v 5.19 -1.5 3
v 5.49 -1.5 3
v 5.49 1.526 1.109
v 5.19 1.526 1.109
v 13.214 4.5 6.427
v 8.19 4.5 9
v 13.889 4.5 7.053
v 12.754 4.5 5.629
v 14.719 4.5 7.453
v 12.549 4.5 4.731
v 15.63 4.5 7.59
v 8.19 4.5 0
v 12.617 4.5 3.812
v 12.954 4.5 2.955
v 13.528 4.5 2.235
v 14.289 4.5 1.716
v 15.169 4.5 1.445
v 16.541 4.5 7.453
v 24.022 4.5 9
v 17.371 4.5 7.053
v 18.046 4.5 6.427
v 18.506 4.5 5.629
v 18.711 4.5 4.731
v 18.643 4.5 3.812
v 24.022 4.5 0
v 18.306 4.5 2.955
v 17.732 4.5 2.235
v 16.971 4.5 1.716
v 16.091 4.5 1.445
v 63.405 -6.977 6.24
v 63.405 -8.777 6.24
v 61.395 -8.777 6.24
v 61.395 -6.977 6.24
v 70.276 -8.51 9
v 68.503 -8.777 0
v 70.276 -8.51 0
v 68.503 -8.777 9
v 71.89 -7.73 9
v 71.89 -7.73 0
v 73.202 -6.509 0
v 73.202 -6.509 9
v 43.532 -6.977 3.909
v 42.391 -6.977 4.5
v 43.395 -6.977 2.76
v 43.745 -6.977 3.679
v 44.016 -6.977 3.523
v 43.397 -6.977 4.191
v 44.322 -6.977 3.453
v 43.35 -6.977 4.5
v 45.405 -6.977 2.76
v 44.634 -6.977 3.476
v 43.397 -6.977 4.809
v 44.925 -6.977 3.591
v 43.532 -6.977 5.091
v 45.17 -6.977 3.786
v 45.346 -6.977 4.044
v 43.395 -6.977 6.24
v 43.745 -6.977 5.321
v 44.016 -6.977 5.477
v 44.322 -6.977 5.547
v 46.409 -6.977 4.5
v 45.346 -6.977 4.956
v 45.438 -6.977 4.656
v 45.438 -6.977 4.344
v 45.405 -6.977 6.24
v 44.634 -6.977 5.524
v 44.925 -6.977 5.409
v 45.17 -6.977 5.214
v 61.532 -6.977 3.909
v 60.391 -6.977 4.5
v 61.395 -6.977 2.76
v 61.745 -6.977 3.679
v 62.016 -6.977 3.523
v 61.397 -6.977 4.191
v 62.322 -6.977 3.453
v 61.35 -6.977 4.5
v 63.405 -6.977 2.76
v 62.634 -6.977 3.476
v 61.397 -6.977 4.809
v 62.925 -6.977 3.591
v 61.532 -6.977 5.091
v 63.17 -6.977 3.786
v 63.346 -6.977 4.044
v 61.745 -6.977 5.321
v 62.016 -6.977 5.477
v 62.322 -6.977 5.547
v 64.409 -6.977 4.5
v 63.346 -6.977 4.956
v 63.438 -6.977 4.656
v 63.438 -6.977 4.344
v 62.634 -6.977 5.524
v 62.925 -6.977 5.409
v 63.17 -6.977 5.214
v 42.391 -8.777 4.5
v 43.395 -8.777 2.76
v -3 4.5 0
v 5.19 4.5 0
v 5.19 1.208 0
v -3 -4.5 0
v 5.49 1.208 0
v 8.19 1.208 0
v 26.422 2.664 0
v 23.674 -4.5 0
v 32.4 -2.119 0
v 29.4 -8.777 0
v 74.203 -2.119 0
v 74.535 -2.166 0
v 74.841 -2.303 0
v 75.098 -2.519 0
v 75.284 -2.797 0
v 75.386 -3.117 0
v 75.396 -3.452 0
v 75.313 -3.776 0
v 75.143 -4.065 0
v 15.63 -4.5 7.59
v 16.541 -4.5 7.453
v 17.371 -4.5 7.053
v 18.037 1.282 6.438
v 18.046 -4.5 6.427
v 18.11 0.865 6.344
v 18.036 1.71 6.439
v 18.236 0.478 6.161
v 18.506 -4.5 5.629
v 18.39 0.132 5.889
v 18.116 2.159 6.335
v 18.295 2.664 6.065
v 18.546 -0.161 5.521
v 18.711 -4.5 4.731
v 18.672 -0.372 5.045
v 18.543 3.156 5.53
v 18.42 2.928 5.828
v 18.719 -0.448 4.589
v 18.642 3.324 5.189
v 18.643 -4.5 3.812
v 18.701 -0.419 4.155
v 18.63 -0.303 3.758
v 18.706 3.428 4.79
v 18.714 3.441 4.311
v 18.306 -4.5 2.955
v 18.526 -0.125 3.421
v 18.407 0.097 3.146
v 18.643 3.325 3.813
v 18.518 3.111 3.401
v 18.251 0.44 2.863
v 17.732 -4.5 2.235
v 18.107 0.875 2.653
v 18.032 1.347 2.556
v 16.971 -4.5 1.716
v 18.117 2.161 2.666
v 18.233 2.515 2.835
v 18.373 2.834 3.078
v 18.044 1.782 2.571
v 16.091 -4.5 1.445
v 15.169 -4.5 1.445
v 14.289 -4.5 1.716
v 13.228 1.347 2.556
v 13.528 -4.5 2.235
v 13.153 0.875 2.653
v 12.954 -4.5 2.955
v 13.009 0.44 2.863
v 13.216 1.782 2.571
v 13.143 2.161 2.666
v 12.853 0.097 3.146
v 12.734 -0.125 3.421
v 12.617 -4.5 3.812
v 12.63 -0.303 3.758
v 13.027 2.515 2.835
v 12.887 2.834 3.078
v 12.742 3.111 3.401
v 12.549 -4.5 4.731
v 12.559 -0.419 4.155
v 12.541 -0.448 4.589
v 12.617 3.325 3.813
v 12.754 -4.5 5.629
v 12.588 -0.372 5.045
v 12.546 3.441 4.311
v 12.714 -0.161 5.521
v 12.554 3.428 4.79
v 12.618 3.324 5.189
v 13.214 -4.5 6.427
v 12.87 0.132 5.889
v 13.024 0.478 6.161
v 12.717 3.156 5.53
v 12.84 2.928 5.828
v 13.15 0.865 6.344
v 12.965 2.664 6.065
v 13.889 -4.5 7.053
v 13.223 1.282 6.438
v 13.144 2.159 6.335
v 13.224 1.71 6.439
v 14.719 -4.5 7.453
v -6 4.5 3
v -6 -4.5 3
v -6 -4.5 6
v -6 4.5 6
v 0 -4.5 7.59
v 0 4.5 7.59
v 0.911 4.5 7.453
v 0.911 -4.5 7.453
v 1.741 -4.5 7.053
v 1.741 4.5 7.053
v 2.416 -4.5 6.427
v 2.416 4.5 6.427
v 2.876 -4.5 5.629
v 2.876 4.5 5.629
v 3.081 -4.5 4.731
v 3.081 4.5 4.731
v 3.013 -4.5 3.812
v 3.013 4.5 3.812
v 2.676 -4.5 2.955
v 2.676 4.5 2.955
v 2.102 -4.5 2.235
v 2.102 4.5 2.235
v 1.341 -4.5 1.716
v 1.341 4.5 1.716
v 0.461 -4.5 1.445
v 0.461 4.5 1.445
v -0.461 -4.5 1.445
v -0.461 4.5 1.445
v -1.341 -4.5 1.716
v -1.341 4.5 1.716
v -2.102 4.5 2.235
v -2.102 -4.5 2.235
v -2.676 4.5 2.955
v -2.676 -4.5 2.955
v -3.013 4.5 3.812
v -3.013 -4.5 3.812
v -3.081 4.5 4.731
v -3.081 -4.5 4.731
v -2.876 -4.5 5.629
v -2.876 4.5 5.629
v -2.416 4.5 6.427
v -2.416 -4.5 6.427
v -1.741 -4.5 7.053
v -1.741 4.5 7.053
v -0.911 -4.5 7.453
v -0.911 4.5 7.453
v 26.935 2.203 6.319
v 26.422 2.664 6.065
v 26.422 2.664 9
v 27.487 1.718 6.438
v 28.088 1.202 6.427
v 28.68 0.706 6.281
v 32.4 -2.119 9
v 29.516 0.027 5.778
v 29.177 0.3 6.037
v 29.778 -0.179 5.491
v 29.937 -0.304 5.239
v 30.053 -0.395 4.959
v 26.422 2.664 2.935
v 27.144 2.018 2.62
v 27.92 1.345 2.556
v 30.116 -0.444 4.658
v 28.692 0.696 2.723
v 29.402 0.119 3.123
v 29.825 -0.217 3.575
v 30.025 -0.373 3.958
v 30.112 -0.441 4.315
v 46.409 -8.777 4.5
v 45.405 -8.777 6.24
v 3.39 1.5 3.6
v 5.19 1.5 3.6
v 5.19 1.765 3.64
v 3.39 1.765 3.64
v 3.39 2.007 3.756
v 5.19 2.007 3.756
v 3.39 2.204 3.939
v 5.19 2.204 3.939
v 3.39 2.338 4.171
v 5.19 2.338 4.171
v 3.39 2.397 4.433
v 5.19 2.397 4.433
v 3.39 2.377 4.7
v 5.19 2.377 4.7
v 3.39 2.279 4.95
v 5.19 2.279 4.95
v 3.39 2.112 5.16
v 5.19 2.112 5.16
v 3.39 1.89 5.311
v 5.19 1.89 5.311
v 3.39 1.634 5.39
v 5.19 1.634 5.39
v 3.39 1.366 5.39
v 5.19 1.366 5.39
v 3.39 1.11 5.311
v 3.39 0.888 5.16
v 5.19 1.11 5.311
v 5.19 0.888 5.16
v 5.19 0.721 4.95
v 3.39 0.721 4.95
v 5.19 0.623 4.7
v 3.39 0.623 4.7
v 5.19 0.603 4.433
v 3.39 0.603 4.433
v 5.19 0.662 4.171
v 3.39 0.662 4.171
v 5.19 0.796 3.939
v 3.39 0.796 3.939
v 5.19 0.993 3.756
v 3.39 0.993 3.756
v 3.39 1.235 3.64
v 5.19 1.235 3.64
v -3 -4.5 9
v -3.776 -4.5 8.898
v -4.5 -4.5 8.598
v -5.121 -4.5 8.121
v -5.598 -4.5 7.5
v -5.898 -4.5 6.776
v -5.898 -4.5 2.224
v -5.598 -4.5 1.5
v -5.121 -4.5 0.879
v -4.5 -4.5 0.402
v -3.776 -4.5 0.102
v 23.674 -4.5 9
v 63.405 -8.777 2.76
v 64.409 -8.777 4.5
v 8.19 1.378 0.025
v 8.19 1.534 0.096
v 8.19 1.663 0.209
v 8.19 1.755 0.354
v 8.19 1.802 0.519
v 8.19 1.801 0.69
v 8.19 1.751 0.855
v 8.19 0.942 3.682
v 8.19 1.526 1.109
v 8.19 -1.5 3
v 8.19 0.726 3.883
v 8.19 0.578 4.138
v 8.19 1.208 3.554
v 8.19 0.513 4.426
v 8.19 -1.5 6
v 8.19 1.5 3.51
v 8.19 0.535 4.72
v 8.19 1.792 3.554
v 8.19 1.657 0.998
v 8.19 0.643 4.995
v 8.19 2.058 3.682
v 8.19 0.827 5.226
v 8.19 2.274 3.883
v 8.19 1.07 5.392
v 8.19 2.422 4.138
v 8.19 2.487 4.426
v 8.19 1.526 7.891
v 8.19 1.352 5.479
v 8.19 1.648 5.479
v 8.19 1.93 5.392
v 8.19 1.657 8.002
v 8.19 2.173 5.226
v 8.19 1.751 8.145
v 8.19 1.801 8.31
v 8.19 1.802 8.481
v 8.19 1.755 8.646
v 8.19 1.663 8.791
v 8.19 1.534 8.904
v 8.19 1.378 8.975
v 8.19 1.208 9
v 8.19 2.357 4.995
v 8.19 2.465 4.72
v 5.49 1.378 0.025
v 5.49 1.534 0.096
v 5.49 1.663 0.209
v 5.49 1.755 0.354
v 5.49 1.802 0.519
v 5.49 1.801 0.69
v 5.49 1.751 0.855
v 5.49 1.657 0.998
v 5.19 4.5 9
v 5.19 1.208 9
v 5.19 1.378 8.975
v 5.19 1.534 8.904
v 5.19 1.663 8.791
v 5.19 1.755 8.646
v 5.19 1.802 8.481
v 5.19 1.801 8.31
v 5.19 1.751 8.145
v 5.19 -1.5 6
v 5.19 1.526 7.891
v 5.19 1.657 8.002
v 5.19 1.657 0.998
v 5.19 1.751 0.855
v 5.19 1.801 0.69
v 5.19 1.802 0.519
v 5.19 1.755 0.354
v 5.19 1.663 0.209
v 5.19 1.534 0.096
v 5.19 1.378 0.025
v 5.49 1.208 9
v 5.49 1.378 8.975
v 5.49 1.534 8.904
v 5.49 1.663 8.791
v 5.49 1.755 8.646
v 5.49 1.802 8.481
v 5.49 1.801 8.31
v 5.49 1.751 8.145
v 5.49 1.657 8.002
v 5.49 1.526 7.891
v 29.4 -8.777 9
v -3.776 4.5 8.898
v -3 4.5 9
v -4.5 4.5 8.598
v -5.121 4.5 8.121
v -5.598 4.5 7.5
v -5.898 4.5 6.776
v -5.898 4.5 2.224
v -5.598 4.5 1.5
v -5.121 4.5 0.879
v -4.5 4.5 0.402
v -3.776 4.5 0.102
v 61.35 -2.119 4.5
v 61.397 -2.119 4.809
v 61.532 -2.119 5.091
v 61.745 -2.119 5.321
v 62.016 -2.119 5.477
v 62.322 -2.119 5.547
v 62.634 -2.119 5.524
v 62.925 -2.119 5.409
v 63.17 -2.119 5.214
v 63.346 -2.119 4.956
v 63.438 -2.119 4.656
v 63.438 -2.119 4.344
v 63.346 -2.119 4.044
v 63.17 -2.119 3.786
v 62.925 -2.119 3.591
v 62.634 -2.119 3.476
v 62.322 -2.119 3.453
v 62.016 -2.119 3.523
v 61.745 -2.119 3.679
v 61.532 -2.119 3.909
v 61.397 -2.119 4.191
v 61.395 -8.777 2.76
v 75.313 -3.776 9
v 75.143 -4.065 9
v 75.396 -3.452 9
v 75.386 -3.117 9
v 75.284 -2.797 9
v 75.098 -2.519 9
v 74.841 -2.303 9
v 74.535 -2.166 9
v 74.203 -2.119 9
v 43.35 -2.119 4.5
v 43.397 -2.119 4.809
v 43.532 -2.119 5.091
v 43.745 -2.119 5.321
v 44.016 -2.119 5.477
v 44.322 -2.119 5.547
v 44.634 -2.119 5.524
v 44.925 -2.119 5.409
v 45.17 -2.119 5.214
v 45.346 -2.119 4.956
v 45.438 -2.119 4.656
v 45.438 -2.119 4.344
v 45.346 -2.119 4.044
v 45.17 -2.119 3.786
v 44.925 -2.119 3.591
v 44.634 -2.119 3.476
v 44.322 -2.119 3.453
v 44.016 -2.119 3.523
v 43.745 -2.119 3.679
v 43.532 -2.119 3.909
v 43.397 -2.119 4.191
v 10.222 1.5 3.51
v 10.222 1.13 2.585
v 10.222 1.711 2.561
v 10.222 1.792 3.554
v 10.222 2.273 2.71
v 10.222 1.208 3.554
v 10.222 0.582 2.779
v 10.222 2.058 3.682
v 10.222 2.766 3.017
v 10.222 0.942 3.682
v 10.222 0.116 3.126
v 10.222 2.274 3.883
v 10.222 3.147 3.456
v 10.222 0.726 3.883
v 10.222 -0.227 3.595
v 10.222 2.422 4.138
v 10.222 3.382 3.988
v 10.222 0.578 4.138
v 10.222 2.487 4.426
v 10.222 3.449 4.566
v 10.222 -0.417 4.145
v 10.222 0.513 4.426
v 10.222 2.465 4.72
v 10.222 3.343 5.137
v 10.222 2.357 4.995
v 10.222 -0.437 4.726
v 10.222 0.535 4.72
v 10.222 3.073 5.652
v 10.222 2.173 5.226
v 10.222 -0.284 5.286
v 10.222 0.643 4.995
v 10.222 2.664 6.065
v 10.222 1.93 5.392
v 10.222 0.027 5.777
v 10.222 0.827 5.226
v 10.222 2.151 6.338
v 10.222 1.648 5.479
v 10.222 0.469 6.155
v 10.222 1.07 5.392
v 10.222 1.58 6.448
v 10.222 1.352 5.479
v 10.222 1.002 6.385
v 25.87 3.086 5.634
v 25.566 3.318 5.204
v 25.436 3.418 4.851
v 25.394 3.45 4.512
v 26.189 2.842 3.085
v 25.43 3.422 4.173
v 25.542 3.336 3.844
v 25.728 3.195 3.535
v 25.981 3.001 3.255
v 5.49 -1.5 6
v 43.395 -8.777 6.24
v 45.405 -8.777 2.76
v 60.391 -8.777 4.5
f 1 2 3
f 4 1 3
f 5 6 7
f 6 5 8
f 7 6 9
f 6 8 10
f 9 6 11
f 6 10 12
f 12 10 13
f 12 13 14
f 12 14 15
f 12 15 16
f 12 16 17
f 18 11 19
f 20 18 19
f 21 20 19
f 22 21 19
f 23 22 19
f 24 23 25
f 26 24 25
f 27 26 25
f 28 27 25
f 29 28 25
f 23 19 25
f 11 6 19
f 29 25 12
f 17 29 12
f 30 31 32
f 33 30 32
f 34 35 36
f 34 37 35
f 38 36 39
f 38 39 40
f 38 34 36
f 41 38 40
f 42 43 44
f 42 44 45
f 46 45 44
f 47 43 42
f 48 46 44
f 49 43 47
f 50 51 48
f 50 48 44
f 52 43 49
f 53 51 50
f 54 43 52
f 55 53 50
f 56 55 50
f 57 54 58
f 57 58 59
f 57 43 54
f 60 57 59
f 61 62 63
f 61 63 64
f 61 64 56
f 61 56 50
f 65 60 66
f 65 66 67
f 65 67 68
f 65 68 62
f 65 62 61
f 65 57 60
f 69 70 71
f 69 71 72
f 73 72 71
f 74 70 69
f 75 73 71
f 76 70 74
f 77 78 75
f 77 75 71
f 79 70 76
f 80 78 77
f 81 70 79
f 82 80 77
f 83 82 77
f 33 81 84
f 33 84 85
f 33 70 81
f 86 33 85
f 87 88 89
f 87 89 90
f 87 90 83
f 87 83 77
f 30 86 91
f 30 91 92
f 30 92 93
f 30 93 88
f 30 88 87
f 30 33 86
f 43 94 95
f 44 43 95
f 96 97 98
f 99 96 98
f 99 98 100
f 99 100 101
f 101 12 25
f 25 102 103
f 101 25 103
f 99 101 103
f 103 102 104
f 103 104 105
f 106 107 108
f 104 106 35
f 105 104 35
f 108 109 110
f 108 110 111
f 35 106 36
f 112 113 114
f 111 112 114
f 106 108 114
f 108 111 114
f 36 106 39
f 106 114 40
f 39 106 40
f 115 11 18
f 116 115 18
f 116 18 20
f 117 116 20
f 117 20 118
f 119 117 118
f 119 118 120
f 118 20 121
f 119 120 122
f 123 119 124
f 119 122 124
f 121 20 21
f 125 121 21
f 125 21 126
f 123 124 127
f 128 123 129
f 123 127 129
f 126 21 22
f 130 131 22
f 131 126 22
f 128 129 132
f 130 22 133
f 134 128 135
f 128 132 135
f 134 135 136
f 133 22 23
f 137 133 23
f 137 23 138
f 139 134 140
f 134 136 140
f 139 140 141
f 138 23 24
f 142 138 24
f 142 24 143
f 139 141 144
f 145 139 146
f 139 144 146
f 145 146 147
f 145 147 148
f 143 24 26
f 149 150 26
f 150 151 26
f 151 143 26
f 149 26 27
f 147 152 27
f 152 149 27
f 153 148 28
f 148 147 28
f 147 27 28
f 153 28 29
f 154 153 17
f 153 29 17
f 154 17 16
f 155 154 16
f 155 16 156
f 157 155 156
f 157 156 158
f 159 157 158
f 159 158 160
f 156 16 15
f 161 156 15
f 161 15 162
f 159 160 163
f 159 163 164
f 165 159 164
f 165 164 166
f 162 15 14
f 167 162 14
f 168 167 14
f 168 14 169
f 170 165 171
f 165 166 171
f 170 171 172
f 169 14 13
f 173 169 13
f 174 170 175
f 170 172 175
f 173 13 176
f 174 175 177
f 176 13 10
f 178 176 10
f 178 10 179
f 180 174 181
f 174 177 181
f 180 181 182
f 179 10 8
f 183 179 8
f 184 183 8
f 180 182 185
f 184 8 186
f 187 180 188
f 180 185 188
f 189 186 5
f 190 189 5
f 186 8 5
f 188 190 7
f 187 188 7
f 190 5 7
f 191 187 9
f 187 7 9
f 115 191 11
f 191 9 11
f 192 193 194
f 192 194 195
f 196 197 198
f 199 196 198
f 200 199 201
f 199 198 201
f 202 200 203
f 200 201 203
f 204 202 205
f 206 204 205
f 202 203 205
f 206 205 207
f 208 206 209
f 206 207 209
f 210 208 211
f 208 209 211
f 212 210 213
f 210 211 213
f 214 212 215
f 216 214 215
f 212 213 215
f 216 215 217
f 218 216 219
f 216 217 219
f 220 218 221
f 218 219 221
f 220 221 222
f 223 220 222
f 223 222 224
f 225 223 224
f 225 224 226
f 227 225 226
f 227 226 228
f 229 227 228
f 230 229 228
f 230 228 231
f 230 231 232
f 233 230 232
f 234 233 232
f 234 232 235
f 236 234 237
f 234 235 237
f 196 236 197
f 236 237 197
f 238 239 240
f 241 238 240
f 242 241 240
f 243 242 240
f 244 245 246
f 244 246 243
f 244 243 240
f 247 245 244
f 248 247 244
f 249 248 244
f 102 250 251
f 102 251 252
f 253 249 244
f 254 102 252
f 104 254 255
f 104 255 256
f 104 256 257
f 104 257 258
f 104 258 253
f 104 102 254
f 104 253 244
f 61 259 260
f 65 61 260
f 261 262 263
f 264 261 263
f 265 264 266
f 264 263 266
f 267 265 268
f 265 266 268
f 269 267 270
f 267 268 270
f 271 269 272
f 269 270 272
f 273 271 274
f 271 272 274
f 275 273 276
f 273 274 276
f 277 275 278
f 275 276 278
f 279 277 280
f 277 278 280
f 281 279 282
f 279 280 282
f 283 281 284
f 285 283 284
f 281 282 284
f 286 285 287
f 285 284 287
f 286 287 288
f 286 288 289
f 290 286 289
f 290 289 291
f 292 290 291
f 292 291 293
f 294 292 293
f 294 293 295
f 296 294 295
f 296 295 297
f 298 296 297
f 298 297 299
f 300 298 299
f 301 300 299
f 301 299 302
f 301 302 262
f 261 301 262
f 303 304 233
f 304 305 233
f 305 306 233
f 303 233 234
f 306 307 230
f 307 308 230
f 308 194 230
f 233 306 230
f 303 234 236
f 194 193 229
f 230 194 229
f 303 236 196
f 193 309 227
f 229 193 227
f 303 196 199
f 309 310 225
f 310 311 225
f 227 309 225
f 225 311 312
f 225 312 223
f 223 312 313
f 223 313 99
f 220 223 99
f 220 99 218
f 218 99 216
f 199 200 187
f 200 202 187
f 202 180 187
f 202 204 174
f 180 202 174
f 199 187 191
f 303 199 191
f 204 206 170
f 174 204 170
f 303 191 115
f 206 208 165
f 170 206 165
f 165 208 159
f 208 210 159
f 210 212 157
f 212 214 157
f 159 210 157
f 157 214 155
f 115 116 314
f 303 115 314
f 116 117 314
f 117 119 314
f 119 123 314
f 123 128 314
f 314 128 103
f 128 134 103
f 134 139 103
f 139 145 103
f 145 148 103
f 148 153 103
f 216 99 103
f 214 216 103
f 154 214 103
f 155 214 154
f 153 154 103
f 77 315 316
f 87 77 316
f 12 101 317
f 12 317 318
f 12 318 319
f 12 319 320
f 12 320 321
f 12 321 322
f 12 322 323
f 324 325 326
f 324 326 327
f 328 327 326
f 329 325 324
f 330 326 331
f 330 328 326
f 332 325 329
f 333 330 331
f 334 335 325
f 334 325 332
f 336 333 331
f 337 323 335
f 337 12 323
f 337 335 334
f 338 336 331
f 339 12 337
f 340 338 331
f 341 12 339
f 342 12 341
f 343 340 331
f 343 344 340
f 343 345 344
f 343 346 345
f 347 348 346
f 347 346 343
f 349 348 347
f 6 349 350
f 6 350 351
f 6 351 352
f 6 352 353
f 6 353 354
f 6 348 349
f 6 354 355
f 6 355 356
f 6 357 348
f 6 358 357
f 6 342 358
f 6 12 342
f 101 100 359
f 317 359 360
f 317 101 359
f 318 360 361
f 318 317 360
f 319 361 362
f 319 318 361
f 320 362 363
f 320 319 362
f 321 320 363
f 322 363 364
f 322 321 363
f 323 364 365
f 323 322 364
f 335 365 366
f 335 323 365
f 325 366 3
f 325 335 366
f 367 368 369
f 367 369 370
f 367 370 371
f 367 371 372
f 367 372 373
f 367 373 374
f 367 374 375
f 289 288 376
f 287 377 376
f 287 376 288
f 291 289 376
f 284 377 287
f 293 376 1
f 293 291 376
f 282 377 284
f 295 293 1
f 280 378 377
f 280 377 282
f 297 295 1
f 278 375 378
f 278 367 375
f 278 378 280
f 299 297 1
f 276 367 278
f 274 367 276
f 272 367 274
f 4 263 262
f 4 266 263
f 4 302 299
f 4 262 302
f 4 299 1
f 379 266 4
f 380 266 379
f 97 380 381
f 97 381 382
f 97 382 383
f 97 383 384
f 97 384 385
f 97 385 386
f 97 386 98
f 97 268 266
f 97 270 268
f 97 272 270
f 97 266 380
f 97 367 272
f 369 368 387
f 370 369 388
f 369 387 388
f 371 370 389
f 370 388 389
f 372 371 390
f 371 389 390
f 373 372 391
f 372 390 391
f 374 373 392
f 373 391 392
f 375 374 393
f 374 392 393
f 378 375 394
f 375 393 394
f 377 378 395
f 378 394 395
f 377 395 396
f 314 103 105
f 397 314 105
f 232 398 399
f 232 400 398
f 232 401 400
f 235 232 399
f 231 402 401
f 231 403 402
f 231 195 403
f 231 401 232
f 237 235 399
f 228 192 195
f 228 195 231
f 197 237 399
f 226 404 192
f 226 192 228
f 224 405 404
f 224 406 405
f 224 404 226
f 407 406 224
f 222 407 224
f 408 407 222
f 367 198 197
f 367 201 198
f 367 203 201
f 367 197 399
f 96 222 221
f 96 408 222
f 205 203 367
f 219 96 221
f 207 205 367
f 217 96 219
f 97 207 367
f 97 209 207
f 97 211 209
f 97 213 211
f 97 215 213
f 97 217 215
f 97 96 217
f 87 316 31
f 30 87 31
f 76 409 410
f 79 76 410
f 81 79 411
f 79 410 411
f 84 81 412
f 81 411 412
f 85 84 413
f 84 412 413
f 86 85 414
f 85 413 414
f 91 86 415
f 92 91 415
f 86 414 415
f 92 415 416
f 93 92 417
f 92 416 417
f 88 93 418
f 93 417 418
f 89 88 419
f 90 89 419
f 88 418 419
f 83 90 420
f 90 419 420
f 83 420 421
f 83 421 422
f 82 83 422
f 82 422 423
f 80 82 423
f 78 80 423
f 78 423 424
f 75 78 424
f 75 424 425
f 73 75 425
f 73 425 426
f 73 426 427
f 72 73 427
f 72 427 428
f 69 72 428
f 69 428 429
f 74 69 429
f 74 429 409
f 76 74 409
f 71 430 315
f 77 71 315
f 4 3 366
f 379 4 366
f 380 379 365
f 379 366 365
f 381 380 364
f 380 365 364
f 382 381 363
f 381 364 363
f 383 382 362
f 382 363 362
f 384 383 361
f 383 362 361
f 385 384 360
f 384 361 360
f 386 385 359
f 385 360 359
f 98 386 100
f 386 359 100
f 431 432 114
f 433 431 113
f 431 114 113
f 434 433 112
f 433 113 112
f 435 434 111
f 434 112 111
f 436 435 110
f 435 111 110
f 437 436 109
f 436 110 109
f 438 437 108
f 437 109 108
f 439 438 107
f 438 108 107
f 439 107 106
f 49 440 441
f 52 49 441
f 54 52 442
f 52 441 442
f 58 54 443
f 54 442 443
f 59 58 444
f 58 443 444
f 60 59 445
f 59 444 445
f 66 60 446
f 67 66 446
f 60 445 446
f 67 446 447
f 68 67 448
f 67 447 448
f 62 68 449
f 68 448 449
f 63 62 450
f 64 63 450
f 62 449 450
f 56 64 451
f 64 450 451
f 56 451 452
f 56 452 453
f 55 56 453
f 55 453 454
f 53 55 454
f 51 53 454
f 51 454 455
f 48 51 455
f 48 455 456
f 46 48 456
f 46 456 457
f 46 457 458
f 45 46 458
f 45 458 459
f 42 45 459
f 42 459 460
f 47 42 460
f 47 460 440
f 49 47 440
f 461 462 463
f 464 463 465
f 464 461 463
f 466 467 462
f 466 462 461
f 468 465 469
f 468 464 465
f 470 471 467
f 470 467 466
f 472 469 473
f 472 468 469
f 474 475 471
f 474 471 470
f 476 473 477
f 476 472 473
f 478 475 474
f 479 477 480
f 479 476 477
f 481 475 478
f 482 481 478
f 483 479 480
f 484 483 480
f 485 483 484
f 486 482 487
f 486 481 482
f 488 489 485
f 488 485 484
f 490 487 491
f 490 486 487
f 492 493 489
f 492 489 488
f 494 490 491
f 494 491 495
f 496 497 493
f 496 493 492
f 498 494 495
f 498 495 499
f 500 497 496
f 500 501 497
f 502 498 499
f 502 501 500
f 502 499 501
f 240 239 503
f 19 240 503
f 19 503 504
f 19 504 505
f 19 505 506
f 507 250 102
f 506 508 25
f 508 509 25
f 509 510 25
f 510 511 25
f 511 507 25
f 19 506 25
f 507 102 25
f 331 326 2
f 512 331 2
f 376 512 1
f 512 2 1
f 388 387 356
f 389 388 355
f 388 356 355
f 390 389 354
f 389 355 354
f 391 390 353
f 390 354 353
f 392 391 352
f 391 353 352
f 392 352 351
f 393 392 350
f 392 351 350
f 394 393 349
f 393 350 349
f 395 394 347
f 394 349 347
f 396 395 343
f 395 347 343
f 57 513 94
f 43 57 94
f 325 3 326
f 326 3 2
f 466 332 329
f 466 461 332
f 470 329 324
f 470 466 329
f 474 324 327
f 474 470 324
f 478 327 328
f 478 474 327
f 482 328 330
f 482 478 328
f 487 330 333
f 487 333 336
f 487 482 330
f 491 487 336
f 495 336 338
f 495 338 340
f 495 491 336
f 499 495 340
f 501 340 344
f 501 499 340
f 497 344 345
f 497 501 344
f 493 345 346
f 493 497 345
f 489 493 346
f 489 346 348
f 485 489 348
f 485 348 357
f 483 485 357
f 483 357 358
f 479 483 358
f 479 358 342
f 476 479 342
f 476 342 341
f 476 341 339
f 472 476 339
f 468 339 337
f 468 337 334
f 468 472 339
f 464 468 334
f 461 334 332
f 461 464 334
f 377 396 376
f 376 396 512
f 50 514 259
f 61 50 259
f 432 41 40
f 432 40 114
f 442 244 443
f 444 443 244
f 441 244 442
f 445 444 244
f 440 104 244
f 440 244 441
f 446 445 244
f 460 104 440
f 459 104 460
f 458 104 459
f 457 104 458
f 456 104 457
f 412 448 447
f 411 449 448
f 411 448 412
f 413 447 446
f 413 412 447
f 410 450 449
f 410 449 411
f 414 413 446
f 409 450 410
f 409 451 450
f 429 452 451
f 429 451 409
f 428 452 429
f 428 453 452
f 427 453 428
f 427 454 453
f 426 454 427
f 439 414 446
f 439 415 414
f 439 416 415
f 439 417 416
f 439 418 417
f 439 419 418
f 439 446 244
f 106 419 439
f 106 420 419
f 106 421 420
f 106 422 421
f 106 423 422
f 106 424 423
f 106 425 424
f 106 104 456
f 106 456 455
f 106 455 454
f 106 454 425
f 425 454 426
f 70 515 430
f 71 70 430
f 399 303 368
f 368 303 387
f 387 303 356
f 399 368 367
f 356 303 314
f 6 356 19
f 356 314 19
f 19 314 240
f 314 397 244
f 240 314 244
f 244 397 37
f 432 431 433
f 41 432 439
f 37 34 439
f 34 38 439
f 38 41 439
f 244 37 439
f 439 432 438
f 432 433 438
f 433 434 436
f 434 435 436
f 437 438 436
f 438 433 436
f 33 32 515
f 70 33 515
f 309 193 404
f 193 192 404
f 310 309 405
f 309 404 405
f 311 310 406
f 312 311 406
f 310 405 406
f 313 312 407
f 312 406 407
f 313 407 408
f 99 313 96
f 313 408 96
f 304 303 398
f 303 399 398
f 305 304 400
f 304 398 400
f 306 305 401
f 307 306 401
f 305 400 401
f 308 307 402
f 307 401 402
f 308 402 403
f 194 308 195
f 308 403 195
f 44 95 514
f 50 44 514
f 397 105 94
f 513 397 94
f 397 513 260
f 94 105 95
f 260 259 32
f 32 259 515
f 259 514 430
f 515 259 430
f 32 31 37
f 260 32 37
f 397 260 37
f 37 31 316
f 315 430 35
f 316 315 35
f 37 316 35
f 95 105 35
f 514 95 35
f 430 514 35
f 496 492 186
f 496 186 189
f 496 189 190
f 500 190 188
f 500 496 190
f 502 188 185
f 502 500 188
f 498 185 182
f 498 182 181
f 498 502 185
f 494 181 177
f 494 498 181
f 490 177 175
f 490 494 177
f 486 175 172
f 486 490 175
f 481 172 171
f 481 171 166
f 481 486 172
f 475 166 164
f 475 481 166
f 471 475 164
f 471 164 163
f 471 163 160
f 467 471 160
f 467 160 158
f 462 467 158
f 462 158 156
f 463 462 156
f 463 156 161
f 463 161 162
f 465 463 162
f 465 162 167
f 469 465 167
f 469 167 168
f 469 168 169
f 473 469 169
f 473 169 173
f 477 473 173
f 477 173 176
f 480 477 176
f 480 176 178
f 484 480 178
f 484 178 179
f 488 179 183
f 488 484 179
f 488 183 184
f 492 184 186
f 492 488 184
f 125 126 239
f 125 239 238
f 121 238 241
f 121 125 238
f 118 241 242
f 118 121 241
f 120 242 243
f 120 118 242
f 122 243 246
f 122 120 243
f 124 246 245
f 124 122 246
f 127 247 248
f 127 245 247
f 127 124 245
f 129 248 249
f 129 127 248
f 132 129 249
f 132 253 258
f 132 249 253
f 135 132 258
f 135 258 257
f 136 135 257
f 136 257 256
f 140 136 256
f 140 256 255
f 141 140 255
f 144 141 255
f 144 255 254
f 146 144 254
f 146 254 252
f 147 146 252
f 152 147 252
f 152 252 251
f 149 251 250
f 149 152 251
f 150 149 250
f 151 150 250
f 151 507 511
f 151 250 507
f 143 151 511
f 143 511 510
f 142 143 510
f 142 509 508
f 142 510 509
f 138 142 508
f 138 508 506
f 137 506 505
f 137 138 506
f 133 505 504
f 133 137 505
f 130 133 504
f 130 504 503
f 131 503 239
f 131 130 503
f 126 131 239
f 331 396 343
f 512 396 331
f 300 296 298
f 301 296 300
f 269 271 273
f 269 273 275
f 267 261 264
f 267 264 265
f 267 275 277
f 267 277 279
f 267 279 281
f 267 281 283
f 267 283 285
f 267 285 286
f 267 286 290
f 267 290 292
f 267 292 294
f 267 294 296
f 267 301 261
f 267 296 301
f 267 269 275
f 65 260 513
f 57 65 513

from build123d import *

# Parameters (mm, degrees)
EXTRUDE_1_DEPTH          = 15
SKETCH_2_R               = 5.15
CUT_EXTRUDE_1_DEPTH      = 15
EXTRUDE_3_DEPTH          = 15
SKETCH_5_W               = 5
SKETCH_5_H               = 10
CUT_EXTRUDE_3_DEPTH      = 15
CUT_EXTRUDE_4_DEPTH      = 15
CUT_EXTRUDE_4_DEPTH_BACK = 27
SKETCH_6_R               = 3.25
SKETCH_7_R               = 1.5
CUT_EXTRUDE_5_DEPTH      = 3.5
CUT_EXTRUDE_7_DEPTH      = 15
EXTRUDE_4_REACH          = 135.688
SKETCH_12_R              = 1.75
CUT_EXTRUDE_9_DEPTH      = 50
CUT_EXTRUDE_10_DEPTH     = 3
SKETCH_14_R              = 1.65
CUT_EXTRUDE_11_DEPTH     = 5
SKETCH_15_R              = 5.15
CUT_EXTRUDE_12_DEPTH     = 15
CUT_EXTRUDE_13_DEPTH     = 15
CUT_EXTRUDE_14_DEPTH     = 15
SKETCH_18_W              = 30
SKETCH_18_H              = 15
CUT_EXTRUDE_15_DEPTH     = 15
CUT_EXTRUDE_16_DEPTH     = 135
FILLET_3_R               = 10
FILLET_4_R               = 2
FILLET_5_R               = 5
EXTRUDE_5_DEPTH          = 5
FILLET_6_R               = 1
CUT_EXTRUDE_17_DEPTH     = 0.5
SKETCH_22_R              = 1.65
EXTRUDE_6_DEPTH          = 0.5
SCALE_1_SCALE            = 0.6


with BuildPart() as part:
    # 草图1 → 凸台-拉伸1 (new body)
    with BuildSketch(Plane.XY):
        with BuildLine():
            Line((40, 7.5), (-40, 7.5))
            Line((-40, 7.5), (-40, -7.5))
            Line((-40, -7.5), (39.456922296, -7.5))
            add(Edge.make_bspline(
                [(39.456922296, -7.5), (46.411815441, -13.348879485), (59.483442953, -20.788944656), (71.646457346, -24.94425278), (84, -26.35191574), (96.353542654, -24.94425278), (108.516557047, -20.788944656), (123.382931224, -12.327351589), (132.036036764, -4.43964044)],
                knots=[0.037726639, 0.037726639, 0.037726639, 0.1875, 0.3125, 0.4375, 0.5625, 0.6875, 0.8125, 1, 1, 1], degree=2))
            Line((132.036036764, -4.43964044), (123.963963236, 4.43964044))
            add(Edge.make_bspline(
                [(44.036036764, 4.43964044), (51.882931224, -2.672648411), (64.516557047, -9.836055344), (74.353542654, -13.18074722), (84, -14.27308426), (93.646457346, -13.18074722), (103.483442953, -9.836055344), (116.117068776, -2.672648411), (123.963963236, 4.43964044)],
                knots=[0, 0, 0, 0.1875, 0.3125, 0.4375, 0.5625, 0.6875, 0.8125, 1, 1, 1], degree=2))
            Line((44.036036764, 4.43964044), (40, 7.5))
        make_face()
    extrude(amount=EXTRUDE_1_DEPTH)

    # 草图2 → 切除-拉伸1 (cut)
    with BuildSketch(Plane(origin=(0, 7.5, 0), x_dir=(1, 0, 0), z_dir=(0, 1, 0))):
        with Locations(Location((0, -7.5, 0), (0, 0, 270))):
            Circle(SKETCH_2_R)
    extrude(amount=-CUT_EXTRUDE_1_DEPTH, mode=Mode.SUBTRACT)

    # 草图4 → 凸台-拉伸3 (add)
    with BuildSketch(Plane(origin=(0, 0, 0), x_dir=(-1, 0, 0), z_dir=(0, 0, -1))):
        Polygon((-40, 7.5), (-44.036036764, 7.5), (-44.036036764, 4.43964044), align=None)
    extrude(amount=-EXTRUDE_3_DEPTH)

    # 草图5 → 切除-拉伸3 (cut)
    with BuildSketch(Plane(origin=(0, 0, 0), x_dir=(-1, 0, 0), z_dir=(0, 0, -1))):
        with Locations((-11.65, 2.5)):
            Rectangle(SKETCH_5_W, SKETCH_5_H)
    extrude(amount=-CUT_EXTRUDE_3_DEPTH, mode=Mode.SUBTRACT)

    # 草图6 → 切除-拉伸4 (cut, two sides: drawn at the far end of the back side and taken through both)
    with BuildSketch(Plane(origin=(44.036036764, 0, 0), x_dir=(0, 0, -1), z_dir=(1, 0, 0)).offset(-CUT_EXTRUDE_4_DEPTH_BACK)):
        with Locations(Location((-7.5, 2.5, 0), (0, 0, 143.358054803))):
            Circle(SKETCH_6_R)
    extrude(amount=CUT_EXTRUDE_4_DEPTH + CUT_EXTRUDE_4_DEPTH_BACK, mode=Mode.SUBTRACT)

    # 草图7 → 切除-拉伸5 (cut)
    with BuildSketch(Plane(origin=(9.15, 0, 0), x_dir=(0, 0, -1), z_dir=(1, 0, 0))):
        with Locations((-7.5, 2.5)):
            Circle(SKETCH_7_R)
    extrude(amount=-CUT_EXTRUDE_5_DEPTH, mode=Mode.SUBTRACT)

    # 草图9 → 切除-拉伸7 (cut)
    with BuildSketch(Plane(origin=(0, 0, 0), x_dir=(-1, 0, 0), z_dir=(0, 0, -1))):
        with BuildLine():
            Line((-49, -14.628935139), (-119, -14.628935139))
            add(Edge.make_bspline(
                [(-49, -14.628935139), (-51.259755236, -16.108213622), (-59.483442953, -20.788944656), (-71.646457346, -24.94425278), (-84, -26.35191574), (-96.353542654, -24.94425278), (-108.516557047, -20.788944656), (-116.740244764, -16.108213622), (-119, -14.628935139)],
                knots=[0.139633208, 0.139633208, 0.139633208, 0.1875, 0.3125, 0.4375, 0.5625, 0.6875, 0.8125, 0.860366792, 0.860366792, 0.860366792], degree=2))
        make_face()
    extrude(amount=-CUT_EXTRUDE_7_DEPTH, mode=Mode.SUBTRACT)

    # 凸台-拉伸4: up to this face of the body (flat: up to its plane)
    extrude_4_end = Plane(part.part.faces().sort_by_distance((30.242148565, -2.823725013, 15))[0])
    # 草图10 → 凸台-拉伸4 (add, up to the picked face)
    with BuildSketch(Plane(origin=(0, 0, 0), x_dir=(-1, 0, 0), z_dir=(0, 0, -1)), mode=Mode.PRIVATE) as extrude_4_sk1:
        with BuildLine():
            Line((-114, -3.531559291), (-54, -3.531559291))
            add(Edge.make_bspline(
                [(-54, -3.531559291), (-56.748654683, -5.431567952), (-64.516557047, -9.836055344), (-74.353542654, -13.18074722), (-84, -14.27308426), (-93.646457346, -13.18074722), (-103.483442953, -9.836055344), (-111.251345317, -5.431567952), (-114, -3.531559291)],
                knots=[0.120356468, 0.120356468, 0.120356468, 0.1875, 0.3125, 0.4375, 0.5625, 0.6875, 0.8125, 0.879643532, 0.879643532, 0.879643532], degree=2))
        make_face()
    extrude_4_tool1 = split(extrude(extrude_4_sk1.sketch, amount=-EXTRUDE_4_REACH, mode=Mode.PRIVATE), bisect_by=extrude_4_end, keep=Keep.BOTH, mode=Mode.PRIVATE)
    add(extrude_4_tool1.solids().sort_by(Axis((84, -7.71433, 0), (0, 0, 1)))[0])

    # 草图12 → 切除-拉伸9 (cut)
    with BuildSketch(Plane(origin=(0, -3.531559291, 0), x_dir=(1, 0, 0), z_dir=(0, 1, 0))):
        with Locations(Location((74.000000001, -7.5, 0), (0, 0, 180))):
            Circle(SKETCH_12_R)
        with Locations(Location((104.000000001, -7.5, 0), (0, 0, 180))):
            Circle(SKETCH_12_R)
    extrude(amount=-CUT_EXTRUDE_9_DEPTH, mode=Mode.SUBTRACT)

    # 草图13 → 切除-拉伸10 (cut)
    with BuildSketch(Plane.XZ.offset(14.628935139)):
        Polygon((75.674315782, 4.6), (77.348631563, 7.5), (75.674315782, 10.4), (72.325684221, 10.4), (70.65136844, 7.5), (72.325684221, 4.6), align=None)
        Polygon((105.674315782, 4.6), (107.348631563, 7.5), (105.674315782, 10.4), (102.325684221, 10.4), (100.65136844, 7.5), (102.325684221, 4.6), align=None)
    extrude(amount=-CUT_EXTRUDE_10_DEPTH, mode=Mode.SUBTRACT)

    # 草图14 → 切除-拉伸11 (cut)
    with BuildSketch(Plane(origin=(17.036036764, 0, 0), x_dir=(0, 0, -1), z_dir=(1, 0, 0))):
        with Locations((-7.5, 2.5)):
            Circle(SKETCH_14_R)
    extrude(amount=-CUT_EXTRUDE_11_DEPTH, mode=Mode.SUBTRACT)

    # 草图15 → 切除-拉伸12 (cut)
    with BuildSketch(Plane(origin=(0, 7.5, 0), x_dir=(1, 0, 0), z_dir=(0, 1, 0))):
        with Locations(Location((26.05, -7.5, 0), (0, 0, 270))):
            Circle(SKETCH_15_R)
    extrude(amount=-CUT_EXTRUDE_12_DEPTH, mode=Mode.SUBTRACT)

    # 草图16 → 切除-拉伸13 (cut)
    with BuildSketch(Plane(origin=(0, 0, 0), x_dir=(-1, 0, 0), z_dir=(0, 0, -1))):
        Polygon((-44.036036764, 4.43964044), (-40.036036764, 7.5), (-44.036036764, 7.5), align=None)
    extrude(amount=-CUT_EXTRUDE_13_DEPTH, mode=Mode.SUBTRACT)

    # 草图17 → 切除-拉伸14 (cut)
    with BuildSketch(Plane(origin=(0, 0, 0), x_dir=(-1, 0, 0), z_dir=(0, 0, -1))):
        Polygon((-114, -3.531559291), (-155.45087664, -3.531559291), (-96.986746886, 29.708253825), align=None)
    extrude(amount=-CUT_EXTRUDE_14_DEPTH, mode=Mode.SUBTRACT)

    # 草图18 → 切除-拉伸15 (cut)
    with BuildSketch(Plane(origin=(0, 0, 0), x_dir=(-1, 0, 0), z_dir=(0, 0, -1))):
        with Locations((25, 0)):
            Rectangle(SKETCH_18_W, SKETCH_18_H)
    extrude(amount=-CUT_EXTRUDE_15_DEPTH, mode=Mode.SUBTRACT)

    # 草图19 → 切除-拉伸16 (cut)
    with BuildSketch(Plane.XY.offset(15)):
        Polygon((119, -14.628935139), (127.815134708, -3.531559292), (136.052125617, -3.531559292), align=None)
    extrude(amount=-CUT_EXTRUDE_16_DEPTH, mode=Mode.SUBTRACT)

    # 圆角3
    fillet_3_edges = [part.edges().sort_by_distance(p)[0] for p in [
        (119, -14.628935139, 7.5),
    ]]
    fillet(fillet_3_edges, radius=FILLET_3_R)

    # 圆角4
    fillet_4_edges = [part.edges().sort_by_distance(p)[0] for p in [
        (127.815134708, -3.531559292, 7.5),
    ]]
    fillet(fillet_4_edges, radius=FILLET_4_R)

    # 圆角5
    fillet_5_edges = [part.edges().sort_by_distance(p)[0] for p in [
        (-10, 0, 15),
        (-10, 0, 0),
    ]]
    fillet(fillet_5_edges, radius=FILLET_5_R)

    # 草图20 → 凸台-拉伸5 (add)
    with BuildSketch(Plane(origin=(9.15, 0, 0), x_dir=(0, 0, -1), z_dir=(1, 0, 0))):
        Polygon((-10, -2.5), (-15, -2.5), (-15, 5.5), align=None)
        Polygon((0, 5.5), (-5, -2.5), (0, -2.5), align=None)
    extrude(amount=EXTRUDE_5_DEPTH)

    # 圆角6
    fillet_6_edges = [part.edges().sort_by_distance(p)[0] for p in [
        (11.65, 5.5, 15),
        (11.65, 5.5, 0),
    ]]
    fillet(fillet_6_edges, radius=FILLET_6_R)

    # 草图21 → 切除-拉伸17 (cut)
    with BuildSketch(Plane(origin=(9.15, 0, 0), x_dir=(0, 0, -1), z_dir=(1, 0, 0))):
        with BuildLine():
            Line((-5, -2.5), (-1.847998304, 2.543202714))
            ThreePointArc((-1.847998304, 2.543202714), (-0.724317487, 2.97445252), (0, 2.013203774))
            Line((0, 2.013203774), (0, 7.5))
            Line((0, 7.5), (-15, 7.5))
            Line((-15, 7.5), (-15, 2.013203774))
            ThreePointArc((-15, 2.013203774), (-14.275682513, 2.97445252), (-13.152001696, 2.543202714))
            Line((-13.152001696, 2.543202714), (-10, -2.5))
            Line((-10, -2.5), (-5, -2.5))
        make_face()
    extrude(amount=-CUT_EXTRUDE_17_DEPTH, mode=Mode.SUBTRACT)

    # 草图22 → 凸台-拉伸6 (add)
    with BuildSketch(Plane.ZY.offset(-14.15)):
        with BuildLine():
            Line((0, 7.5), (0, 2.013203774))
            ThreePointArc((0, 2.013203774), (0.724317487, 2.97445252), (1.847998304, 2.543202714))
            Line((1.847998304, 2.543202714), (5, -2.5))
            Line((5, -2.5), (10, -2.5))
            Line((10, -2.5), (13.152001696, 2.543202714))
            ThreePointArc((13.152001696, 2.543202714), (14.275682513, 2.97445252), (15, 2.013203774))
            Line((15, 2.013203774), (15, 7.5))
            Line((15, 7.5), (0, 7.5))
        make_face()
        with Locations(Location((7.5, 2.5, 0), (0, 0, 180))):
            Circle(SKETCH_22_R, mode=Mode.SUBTRACT)
    extrude(amount=EXTRUDE_6_DEPTH)


with BuildPart() as part_1:
    # 缩放比例1: scaled about (0, 0, 0)
    add(part.part.scale(SCALE_1_SCALE))


solid = part_1.part
